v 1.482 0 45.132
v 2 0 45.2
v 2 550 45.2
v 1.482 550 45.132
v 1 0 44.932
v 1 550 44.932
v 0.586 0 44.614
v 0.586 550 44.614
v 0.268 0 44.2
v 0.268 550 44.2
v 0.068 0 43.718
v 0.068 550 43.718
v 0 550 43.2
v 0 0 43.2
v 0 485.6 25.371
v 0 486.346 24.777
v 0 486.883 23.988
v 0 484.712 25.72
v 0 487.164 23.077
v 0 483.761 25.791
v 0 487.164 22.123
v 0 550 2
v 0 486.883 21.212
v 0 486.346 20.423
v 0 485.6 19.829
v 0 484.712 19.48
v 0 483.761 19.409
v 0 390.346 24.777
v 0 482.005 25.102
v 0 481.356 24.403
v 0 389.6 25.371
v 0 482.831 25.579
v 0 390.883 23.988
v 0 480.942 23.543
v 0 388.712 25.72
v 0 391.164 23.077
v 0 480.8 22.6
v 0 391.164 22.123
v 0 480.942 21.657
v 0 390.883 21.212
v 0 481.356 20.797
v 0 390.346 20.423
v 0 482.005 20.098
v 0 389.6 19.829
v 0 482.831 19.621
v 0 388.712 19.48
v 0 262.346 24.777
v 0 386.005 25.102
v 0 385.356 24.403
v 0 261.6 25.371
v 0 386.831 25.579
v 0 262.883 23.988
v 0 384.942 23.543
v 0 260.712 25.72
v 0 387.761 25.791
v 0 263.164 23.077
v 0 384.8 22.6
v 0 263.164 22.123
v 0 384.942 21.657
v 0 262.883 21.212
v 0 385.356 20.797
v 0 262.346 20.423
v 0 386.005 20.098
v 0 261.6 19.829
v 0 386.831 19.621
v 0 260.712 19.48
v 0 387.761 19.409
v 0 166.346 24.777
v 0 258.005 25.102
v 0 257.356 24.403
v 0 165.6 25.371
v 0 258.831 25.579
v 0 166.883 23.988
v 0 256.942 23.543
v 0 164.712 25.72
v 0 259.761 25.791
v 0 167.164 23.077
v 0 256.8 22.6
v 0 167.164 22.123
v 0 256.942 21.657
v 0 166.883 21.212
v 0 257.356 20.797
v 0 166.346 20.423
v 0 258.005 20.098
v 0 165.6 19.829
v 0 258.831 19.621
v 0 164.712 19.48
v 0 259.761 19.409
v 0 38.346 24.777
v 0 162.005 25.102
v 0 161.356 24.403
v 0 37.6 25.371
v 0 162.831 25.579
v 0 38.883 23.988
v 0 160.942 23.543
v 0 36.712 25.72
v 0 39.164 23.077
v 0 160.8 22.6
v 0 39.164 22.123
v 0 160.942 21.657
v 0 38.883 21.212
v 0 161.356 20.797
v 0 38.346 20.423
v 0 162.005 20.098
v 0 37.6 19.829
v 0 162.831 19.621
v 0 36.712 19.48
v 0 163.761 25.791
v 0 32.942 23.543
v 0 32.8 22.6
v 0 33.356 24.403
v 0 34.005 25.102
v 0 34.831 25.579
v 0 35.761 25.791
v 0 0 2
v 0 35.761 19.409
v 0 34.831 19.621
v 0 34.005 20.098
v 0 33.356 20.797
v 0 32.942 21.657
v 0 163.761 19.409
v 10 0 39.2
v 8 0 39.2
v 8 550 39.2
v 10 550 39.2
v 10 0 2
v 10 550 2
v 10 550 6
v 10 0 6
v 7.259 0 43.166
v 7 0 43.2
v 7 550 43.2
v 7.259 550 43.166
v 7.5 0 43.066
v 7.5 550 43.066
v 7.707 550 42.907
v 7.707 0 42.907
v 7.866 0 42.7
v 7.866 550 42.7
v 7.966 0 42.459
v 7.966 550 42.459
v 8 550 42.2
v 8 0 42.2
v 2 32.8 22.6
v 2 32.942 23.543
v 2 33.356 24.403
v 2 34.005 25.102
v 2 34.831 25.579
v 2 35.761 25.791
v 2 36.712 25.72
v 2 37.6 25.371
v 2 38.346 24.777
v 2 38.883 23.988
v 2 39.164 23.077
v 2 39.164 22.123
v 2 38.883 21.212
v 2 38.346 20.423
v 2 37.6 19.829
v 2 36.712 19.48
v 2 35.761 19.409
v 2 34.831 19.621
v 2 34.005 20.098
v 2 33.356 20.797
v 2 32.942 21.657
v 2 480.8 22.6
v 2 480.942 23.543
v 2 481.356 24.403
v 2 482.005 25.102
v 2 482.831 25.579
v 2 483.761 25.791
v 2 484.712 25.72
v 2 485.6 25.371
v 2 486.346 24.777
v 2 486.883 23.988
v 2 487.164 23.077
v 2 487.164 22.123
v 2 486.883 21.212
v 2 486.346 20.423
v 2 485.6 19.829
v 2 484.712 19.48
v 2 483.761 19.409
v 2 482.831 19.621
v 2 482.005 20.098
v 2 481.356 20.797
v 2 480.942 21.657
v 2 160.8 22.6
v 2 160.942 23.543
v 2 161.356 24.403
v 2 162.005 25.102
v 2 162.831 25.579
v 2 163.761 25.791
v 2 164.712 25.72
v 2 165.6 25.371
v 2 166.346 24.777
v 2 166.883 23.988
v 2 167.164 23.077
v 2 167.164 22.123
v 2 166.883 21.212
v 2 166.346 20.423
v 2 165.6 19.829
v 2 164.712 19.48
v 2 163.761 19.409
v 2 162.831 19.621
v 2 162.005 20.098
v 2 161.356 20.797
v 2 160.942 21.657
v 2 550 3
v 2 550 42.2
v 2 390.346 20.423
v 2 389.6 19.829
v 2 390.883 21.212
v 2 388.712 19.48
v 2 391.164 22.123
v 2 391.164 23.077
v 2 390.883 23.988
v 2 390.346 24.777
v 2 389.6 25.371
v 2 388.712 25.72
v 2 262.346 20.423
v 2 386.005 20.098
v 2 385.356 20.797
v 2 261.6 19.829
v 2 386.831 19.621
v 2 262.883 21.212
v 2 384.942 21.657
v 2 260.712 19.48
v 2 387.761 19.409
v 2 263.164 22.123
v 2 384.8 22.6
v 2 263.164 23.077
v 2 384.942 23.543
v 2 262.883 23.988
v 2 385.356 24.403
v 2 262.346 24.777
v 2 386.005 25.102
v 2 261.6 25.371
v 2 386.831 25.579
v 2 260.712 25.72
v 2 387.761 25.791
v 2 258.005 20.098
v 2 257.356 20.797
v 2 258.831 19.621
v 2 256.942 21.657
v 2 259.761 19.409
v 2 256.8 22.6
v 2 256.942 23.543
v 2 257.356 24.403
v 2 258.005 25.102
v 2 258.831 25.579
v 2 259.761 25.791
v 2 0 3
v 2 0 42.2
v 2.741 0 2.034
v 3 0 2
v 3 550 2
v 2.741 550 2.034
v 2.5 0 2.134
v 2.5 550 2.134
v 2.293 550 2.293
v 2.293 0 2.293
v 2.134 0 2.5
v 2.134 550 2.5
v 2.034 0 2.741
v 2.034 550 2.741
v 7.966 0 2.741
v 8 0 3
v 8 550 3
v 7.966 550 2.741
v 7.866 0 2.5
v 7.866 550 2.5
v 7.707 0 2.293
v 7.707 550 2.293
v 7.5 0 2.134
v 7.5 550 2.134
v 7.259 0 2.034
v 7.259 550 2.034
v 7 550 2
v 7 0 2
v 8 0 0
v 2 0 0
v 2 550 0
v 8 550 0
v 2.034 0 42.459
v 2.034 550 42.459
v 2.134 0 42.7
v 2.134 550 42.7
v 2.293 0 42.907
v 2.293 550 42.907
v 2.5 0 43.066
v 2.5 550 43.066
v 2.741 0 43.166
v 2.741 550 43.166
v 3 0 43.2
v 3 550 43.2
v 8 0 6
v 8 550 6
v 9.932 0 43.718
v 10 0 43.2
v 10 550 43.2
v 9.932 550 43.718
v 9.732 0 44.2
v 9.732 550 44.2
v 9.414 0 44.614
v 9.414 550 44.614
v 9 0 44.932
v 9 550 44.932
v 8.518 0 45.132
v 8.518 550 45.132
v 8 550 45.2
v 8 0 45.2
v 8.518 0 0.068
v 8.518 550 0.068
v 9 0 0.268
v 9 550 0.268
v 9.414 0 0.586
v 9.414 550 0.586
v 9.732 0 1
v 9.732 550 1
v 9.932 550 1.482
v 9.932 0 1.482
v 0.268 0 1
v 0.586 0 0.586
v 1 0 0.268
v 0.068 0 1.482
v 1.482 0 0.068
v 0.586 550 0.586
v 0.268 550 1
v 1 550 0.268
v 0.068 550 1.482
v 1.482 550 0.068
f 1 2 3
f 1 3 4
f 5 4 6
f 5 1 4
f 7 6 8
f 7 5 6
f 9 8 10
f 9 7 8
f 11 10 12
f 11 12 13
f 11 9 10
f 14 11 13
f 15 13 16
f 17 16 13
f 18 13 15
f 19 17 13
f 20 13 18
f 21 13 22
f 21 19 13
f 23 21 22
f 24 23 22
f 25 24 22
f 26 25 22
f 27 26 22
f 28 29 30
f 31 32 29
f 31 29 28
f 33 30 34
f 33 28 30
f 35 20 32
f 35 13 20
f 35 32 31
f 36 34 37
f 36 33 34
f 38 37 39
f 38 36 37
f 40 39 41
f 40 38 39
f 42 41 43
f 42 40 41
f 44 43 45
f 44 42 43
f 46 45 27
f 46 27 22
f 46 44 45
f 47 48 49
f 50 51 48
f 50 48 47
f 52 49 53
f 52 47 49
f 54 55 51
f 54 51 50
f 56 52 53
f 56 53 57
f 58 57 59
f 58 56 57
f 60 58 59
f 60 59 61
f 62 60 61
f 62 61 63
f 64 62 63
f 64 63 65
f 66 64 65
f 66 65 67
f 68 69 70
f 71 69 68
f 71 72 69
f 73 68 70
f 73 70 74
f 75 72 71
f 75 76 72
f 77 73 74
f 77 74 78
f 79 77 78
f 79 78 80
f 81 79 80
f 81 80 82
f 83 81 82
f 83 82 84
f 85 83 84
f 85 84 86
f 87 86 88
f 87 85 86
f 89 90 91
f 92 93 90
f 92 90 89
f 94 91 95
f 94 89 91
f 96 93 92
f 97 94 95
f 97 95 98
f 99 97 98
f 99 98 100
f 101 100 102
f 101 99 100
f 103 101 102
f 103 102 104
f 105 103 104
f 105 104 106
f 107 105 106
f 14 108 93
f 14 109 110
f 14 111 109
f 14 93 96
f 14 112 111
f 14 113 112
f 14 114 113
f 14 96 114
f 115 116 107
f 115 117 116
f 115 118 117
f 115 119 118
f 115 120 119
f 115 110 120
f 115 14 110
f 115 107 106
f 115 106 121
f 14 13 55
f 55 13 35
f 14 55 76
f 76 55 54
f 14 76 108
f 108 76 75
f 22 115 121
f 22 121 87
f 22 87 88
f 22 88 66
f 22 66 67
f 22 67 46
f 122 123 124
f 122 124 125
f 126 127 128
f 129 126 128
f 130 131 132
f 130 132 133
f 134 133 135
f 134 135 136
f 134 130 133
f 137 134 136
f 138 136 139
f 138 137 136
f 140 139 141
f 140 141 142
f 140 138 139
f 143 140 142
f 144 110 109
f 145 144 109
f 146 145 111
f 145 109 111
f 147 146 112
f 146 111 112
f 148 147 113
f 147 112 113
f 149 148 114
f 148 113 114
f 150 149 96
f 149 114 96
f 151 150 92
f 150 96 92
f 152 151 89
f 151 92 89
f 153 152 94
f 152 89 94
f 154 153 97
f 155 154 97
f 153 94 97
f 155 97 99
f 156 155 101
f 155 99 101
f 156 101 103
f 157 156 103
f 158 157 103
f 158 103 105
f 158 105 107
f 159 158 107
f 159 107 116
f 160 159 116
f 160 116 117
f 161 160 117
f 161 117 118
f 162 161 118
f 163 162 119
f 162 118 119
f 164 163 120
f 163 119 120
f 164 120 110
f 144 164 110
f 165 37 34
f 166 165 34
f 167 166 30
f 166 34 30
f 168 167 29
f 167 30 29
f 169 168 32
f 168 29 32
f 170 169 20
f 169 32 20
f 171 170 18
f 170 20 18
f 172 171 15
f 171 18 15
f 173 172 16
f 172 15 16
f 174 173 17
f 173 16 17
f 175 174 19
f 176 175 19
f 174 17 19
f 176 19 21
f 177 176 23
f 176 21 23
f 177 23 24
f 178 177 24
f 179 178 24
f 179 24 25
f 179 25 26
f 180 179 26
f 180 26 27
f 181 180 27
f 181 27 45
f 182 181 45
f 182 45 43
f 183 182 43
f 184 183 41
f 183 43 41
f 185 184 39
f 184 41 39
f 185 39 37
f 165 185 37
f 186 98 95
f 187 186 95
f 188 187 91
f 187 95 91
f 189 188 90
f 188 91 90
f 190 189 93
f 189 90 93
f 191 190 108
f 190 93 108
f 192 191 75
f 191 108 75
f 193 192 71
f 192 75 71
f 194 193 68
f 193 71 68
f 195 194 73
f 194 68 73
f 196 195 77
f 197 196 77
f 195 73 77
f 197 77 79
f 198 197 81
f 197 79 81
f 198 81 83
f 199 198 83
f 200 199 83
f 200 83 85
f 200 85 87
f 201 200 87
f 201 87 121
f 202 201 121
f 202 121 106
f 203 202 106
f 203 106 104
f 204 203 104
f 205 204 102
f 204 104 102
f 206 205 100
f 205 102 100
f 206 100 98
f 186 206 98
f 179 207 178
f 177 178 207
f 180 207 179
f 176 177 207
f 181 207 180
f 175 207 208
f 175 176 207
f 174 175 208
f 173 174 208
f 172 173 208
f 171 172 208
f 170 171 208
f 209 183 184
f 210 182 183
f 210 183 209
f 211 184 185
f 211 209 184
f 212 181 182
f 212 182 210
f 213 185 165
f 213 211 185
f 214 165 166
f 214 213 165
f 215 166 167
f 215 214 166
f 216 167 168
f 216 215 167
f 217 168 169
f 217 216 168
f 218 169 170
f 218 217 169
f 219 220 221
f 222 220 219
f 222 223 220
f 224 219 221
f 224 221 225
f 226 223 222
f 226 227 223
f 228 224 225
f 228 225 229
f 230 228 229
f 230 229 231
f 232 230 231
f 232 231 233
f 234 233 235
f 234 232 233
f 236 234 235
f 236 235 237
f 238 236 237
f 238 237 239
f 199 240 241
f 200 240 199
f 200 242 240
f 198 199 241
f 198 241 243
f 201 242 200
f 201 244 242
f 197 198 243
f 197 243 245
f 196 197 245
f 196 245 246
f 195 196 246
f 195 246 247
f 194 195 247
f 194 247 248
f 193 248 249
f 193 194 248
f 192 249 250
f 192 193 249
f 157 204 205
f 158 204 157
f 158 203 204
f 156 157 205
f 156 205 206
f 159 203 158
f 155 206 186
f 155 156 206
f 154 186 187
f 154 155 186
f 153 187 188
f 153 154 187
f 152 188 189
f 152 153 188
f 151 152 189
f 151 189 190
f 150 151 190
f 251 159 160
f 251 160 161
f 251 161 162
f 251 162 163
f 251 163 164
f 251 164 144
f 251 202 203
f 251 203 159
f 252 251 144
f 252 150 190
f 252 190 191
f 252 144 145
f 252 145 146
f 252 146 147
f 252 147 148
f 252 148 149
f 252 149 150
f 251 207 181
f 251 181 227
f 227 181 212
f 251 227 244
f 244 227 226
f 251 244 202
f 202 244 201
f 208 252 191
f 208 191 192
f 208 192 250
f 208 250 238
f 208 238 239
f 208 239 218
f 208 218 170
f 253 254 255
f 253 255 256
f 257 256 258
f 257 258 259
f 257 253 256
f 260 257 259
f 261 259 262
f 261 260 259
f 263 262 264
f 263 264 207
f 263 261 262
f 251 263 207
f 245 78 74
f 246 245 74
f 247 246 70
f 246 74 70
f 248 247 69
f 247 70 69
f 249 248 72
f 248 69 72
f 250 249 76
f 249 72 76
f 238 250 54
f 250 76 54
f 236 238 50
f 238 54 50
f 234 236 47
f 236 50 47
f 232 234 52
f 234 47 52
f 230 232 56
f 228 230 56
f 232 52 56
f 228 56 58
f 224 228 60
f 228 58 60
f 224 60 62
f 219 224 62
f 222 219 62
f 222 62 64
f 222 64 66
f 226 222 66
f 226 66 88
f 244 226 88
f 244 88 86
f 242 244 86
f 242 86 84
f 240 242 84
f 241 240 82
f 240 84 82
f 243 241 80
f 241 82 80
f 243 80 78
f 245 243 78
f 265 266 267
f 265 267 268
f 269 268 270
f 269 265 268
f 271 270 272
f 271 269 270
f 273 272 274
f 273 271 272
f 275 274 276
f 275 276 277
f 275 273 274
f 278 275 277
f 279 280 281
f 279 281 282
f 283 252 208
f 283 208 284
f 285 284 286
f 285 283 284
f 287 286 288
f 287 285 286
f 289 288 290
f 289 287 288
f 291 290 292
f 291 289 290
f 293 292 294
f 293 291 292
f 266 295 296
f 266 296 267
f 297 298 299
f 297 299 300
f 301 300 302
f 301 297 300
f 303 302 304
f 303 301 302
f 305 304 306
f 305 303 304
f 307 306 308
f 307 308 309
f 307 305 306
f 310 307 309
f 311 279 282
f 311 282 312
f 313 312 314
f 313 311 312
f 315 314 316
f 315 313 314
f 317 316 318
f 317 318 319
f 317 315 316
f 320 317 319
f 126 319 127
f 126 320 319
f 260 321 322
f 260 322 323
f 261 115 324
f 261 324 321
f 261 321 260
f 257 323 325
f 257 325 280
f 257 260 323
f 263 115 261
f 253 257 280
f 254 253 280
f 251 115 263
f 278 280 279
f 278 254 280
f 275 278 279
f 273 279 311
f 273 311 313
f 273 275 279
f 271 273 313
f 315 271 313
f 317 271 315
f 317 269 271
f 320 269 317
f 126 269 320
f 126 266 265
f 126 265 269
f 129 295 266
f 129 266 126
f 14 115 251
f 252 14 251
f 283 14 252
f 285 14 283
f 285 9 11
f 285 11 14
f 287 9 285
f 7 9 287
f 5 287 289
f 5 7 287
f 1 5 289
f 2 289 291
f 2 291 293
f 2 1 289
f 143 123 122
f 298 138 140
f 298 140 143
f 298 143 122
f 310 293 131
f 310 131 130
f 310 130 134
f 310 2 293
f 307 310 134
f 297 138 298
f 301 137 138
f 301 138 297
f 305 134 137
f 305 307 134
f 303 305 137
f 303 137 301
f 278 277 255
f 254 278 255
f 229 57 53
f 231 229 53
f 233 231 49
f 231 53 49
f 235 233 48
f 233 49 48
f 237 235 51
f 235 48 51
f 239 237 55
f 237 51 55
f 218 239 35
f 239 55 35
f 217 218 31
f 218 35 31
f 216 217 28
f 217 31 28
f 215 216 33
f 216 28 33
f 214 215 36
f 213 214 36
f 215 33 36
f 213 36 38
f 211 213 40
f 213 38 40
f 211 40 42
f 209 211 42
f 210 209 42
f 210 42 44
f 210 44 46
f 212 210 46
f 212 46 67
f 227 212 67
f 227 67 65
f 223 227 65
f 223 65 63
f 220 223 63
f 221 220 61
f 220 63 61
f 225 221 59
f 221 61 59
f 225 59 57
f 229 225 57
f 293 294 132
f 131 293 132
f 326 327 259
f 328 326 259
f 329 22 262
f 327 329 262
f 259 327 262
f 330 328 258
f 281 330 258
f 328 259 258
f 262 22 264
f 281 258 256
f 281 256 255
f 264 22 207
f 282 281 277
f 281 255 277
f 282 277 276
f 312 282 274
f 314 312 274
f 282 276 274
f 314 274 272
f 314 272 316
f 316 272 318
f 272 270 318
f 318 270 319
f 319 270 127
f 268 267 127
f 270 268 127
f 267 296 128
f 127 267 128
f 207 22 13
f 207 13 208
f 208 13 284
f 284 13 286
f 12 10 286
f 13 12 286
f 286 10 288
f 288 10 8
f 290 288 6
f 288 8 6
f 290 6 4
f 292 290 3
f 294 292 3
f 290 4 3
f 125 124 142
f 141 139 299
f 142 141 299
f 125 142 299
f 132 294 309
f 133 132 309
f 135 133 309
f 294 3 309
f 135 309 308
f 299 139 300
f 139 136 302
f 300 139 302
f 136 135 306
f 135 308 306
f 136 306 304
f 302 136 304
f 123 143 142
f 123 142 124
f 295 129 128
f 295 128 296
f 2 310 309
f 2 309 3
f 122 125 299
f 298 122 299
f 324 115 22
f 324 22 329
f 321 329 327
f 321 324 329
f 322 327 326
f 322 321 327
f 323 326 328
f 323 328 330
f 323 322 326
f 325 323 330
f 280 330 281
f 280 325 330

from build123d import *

# Parameters (mm, degrees)
F1_DEPTH = 550
F2_R     = 3.2
F3_DEPTH = 2


with BuildPart() as f1:
    # F0 (on Front) → F1 (new body)
    with BuildSketch(Plane.XZ):
        with BuildLine():
            ThreePointArc((0, 2), (0.585786, 0.585786), (2, 0))
            Line((2, 0), (8, 0))
            ThreePointArc((8, 0), (9.414214, 0.585786), (10, 2))
            Line((10, 2), (10, 6))
            Line((10, 6), (8, 6))
            Line((8, 6), (8, 3))
            ThreePointArc((8, 3), (7.707107, 2.292893), (7, 2))
            Line((7, 2), (3, 2))
            ThreePointArc((3, 2), (2.292893, 2.292893), (2, 3))
            Line((2, 3), (2, 42.2))
            ThreePointArc((2, 42.2), (2.292893, 42.907107), (3, 43.2))
            Line((3, 43.2), (7, 43.2))
            ThreePointArc((7, 43.2), (7.707107, 42.907107), (8, 42.2))
            Line((8, 42.2), (8, 39.2))
            Line((8, 39.2), (10, 39.2))
            Line((10, 39.2), (10, 43.2))
            ThreePointArc((10, 43.2), (9.414214, 44.614214), (8, 45.2))
            Line((8, 45.2), (2, 45.2))
            ThreePointArc((2, 45.2), (0.585786, 44.614214), (0, 43.2))
            Line((0, 43.2), (0, 2))
        make_face()
    extrude(amount=-F1_DEPTH)

    # F2 (on face) → F3 (cut)
    with BuildSketch(Plane(origin=(0, 0, 0), x_dir=(0, -1, 0), z_dir=(-1, 0, 0))):
        with Locations((-36, 22.6)):
            Circle(F2_R)
        with Locations((-164, 22.6)):
            Circle(F2_R)
        with Locations((-260, 22.6)):
            Circle(F2_R)
        with Locations((-388, 22.6)):
            Circle(F2_R)
        with Locations((-484, 22.6)):
            Circle(F2_R)
    extrude(amount=-F3_DEPTH, mode=Mode.SUBTRACT)


solid = f1.part
